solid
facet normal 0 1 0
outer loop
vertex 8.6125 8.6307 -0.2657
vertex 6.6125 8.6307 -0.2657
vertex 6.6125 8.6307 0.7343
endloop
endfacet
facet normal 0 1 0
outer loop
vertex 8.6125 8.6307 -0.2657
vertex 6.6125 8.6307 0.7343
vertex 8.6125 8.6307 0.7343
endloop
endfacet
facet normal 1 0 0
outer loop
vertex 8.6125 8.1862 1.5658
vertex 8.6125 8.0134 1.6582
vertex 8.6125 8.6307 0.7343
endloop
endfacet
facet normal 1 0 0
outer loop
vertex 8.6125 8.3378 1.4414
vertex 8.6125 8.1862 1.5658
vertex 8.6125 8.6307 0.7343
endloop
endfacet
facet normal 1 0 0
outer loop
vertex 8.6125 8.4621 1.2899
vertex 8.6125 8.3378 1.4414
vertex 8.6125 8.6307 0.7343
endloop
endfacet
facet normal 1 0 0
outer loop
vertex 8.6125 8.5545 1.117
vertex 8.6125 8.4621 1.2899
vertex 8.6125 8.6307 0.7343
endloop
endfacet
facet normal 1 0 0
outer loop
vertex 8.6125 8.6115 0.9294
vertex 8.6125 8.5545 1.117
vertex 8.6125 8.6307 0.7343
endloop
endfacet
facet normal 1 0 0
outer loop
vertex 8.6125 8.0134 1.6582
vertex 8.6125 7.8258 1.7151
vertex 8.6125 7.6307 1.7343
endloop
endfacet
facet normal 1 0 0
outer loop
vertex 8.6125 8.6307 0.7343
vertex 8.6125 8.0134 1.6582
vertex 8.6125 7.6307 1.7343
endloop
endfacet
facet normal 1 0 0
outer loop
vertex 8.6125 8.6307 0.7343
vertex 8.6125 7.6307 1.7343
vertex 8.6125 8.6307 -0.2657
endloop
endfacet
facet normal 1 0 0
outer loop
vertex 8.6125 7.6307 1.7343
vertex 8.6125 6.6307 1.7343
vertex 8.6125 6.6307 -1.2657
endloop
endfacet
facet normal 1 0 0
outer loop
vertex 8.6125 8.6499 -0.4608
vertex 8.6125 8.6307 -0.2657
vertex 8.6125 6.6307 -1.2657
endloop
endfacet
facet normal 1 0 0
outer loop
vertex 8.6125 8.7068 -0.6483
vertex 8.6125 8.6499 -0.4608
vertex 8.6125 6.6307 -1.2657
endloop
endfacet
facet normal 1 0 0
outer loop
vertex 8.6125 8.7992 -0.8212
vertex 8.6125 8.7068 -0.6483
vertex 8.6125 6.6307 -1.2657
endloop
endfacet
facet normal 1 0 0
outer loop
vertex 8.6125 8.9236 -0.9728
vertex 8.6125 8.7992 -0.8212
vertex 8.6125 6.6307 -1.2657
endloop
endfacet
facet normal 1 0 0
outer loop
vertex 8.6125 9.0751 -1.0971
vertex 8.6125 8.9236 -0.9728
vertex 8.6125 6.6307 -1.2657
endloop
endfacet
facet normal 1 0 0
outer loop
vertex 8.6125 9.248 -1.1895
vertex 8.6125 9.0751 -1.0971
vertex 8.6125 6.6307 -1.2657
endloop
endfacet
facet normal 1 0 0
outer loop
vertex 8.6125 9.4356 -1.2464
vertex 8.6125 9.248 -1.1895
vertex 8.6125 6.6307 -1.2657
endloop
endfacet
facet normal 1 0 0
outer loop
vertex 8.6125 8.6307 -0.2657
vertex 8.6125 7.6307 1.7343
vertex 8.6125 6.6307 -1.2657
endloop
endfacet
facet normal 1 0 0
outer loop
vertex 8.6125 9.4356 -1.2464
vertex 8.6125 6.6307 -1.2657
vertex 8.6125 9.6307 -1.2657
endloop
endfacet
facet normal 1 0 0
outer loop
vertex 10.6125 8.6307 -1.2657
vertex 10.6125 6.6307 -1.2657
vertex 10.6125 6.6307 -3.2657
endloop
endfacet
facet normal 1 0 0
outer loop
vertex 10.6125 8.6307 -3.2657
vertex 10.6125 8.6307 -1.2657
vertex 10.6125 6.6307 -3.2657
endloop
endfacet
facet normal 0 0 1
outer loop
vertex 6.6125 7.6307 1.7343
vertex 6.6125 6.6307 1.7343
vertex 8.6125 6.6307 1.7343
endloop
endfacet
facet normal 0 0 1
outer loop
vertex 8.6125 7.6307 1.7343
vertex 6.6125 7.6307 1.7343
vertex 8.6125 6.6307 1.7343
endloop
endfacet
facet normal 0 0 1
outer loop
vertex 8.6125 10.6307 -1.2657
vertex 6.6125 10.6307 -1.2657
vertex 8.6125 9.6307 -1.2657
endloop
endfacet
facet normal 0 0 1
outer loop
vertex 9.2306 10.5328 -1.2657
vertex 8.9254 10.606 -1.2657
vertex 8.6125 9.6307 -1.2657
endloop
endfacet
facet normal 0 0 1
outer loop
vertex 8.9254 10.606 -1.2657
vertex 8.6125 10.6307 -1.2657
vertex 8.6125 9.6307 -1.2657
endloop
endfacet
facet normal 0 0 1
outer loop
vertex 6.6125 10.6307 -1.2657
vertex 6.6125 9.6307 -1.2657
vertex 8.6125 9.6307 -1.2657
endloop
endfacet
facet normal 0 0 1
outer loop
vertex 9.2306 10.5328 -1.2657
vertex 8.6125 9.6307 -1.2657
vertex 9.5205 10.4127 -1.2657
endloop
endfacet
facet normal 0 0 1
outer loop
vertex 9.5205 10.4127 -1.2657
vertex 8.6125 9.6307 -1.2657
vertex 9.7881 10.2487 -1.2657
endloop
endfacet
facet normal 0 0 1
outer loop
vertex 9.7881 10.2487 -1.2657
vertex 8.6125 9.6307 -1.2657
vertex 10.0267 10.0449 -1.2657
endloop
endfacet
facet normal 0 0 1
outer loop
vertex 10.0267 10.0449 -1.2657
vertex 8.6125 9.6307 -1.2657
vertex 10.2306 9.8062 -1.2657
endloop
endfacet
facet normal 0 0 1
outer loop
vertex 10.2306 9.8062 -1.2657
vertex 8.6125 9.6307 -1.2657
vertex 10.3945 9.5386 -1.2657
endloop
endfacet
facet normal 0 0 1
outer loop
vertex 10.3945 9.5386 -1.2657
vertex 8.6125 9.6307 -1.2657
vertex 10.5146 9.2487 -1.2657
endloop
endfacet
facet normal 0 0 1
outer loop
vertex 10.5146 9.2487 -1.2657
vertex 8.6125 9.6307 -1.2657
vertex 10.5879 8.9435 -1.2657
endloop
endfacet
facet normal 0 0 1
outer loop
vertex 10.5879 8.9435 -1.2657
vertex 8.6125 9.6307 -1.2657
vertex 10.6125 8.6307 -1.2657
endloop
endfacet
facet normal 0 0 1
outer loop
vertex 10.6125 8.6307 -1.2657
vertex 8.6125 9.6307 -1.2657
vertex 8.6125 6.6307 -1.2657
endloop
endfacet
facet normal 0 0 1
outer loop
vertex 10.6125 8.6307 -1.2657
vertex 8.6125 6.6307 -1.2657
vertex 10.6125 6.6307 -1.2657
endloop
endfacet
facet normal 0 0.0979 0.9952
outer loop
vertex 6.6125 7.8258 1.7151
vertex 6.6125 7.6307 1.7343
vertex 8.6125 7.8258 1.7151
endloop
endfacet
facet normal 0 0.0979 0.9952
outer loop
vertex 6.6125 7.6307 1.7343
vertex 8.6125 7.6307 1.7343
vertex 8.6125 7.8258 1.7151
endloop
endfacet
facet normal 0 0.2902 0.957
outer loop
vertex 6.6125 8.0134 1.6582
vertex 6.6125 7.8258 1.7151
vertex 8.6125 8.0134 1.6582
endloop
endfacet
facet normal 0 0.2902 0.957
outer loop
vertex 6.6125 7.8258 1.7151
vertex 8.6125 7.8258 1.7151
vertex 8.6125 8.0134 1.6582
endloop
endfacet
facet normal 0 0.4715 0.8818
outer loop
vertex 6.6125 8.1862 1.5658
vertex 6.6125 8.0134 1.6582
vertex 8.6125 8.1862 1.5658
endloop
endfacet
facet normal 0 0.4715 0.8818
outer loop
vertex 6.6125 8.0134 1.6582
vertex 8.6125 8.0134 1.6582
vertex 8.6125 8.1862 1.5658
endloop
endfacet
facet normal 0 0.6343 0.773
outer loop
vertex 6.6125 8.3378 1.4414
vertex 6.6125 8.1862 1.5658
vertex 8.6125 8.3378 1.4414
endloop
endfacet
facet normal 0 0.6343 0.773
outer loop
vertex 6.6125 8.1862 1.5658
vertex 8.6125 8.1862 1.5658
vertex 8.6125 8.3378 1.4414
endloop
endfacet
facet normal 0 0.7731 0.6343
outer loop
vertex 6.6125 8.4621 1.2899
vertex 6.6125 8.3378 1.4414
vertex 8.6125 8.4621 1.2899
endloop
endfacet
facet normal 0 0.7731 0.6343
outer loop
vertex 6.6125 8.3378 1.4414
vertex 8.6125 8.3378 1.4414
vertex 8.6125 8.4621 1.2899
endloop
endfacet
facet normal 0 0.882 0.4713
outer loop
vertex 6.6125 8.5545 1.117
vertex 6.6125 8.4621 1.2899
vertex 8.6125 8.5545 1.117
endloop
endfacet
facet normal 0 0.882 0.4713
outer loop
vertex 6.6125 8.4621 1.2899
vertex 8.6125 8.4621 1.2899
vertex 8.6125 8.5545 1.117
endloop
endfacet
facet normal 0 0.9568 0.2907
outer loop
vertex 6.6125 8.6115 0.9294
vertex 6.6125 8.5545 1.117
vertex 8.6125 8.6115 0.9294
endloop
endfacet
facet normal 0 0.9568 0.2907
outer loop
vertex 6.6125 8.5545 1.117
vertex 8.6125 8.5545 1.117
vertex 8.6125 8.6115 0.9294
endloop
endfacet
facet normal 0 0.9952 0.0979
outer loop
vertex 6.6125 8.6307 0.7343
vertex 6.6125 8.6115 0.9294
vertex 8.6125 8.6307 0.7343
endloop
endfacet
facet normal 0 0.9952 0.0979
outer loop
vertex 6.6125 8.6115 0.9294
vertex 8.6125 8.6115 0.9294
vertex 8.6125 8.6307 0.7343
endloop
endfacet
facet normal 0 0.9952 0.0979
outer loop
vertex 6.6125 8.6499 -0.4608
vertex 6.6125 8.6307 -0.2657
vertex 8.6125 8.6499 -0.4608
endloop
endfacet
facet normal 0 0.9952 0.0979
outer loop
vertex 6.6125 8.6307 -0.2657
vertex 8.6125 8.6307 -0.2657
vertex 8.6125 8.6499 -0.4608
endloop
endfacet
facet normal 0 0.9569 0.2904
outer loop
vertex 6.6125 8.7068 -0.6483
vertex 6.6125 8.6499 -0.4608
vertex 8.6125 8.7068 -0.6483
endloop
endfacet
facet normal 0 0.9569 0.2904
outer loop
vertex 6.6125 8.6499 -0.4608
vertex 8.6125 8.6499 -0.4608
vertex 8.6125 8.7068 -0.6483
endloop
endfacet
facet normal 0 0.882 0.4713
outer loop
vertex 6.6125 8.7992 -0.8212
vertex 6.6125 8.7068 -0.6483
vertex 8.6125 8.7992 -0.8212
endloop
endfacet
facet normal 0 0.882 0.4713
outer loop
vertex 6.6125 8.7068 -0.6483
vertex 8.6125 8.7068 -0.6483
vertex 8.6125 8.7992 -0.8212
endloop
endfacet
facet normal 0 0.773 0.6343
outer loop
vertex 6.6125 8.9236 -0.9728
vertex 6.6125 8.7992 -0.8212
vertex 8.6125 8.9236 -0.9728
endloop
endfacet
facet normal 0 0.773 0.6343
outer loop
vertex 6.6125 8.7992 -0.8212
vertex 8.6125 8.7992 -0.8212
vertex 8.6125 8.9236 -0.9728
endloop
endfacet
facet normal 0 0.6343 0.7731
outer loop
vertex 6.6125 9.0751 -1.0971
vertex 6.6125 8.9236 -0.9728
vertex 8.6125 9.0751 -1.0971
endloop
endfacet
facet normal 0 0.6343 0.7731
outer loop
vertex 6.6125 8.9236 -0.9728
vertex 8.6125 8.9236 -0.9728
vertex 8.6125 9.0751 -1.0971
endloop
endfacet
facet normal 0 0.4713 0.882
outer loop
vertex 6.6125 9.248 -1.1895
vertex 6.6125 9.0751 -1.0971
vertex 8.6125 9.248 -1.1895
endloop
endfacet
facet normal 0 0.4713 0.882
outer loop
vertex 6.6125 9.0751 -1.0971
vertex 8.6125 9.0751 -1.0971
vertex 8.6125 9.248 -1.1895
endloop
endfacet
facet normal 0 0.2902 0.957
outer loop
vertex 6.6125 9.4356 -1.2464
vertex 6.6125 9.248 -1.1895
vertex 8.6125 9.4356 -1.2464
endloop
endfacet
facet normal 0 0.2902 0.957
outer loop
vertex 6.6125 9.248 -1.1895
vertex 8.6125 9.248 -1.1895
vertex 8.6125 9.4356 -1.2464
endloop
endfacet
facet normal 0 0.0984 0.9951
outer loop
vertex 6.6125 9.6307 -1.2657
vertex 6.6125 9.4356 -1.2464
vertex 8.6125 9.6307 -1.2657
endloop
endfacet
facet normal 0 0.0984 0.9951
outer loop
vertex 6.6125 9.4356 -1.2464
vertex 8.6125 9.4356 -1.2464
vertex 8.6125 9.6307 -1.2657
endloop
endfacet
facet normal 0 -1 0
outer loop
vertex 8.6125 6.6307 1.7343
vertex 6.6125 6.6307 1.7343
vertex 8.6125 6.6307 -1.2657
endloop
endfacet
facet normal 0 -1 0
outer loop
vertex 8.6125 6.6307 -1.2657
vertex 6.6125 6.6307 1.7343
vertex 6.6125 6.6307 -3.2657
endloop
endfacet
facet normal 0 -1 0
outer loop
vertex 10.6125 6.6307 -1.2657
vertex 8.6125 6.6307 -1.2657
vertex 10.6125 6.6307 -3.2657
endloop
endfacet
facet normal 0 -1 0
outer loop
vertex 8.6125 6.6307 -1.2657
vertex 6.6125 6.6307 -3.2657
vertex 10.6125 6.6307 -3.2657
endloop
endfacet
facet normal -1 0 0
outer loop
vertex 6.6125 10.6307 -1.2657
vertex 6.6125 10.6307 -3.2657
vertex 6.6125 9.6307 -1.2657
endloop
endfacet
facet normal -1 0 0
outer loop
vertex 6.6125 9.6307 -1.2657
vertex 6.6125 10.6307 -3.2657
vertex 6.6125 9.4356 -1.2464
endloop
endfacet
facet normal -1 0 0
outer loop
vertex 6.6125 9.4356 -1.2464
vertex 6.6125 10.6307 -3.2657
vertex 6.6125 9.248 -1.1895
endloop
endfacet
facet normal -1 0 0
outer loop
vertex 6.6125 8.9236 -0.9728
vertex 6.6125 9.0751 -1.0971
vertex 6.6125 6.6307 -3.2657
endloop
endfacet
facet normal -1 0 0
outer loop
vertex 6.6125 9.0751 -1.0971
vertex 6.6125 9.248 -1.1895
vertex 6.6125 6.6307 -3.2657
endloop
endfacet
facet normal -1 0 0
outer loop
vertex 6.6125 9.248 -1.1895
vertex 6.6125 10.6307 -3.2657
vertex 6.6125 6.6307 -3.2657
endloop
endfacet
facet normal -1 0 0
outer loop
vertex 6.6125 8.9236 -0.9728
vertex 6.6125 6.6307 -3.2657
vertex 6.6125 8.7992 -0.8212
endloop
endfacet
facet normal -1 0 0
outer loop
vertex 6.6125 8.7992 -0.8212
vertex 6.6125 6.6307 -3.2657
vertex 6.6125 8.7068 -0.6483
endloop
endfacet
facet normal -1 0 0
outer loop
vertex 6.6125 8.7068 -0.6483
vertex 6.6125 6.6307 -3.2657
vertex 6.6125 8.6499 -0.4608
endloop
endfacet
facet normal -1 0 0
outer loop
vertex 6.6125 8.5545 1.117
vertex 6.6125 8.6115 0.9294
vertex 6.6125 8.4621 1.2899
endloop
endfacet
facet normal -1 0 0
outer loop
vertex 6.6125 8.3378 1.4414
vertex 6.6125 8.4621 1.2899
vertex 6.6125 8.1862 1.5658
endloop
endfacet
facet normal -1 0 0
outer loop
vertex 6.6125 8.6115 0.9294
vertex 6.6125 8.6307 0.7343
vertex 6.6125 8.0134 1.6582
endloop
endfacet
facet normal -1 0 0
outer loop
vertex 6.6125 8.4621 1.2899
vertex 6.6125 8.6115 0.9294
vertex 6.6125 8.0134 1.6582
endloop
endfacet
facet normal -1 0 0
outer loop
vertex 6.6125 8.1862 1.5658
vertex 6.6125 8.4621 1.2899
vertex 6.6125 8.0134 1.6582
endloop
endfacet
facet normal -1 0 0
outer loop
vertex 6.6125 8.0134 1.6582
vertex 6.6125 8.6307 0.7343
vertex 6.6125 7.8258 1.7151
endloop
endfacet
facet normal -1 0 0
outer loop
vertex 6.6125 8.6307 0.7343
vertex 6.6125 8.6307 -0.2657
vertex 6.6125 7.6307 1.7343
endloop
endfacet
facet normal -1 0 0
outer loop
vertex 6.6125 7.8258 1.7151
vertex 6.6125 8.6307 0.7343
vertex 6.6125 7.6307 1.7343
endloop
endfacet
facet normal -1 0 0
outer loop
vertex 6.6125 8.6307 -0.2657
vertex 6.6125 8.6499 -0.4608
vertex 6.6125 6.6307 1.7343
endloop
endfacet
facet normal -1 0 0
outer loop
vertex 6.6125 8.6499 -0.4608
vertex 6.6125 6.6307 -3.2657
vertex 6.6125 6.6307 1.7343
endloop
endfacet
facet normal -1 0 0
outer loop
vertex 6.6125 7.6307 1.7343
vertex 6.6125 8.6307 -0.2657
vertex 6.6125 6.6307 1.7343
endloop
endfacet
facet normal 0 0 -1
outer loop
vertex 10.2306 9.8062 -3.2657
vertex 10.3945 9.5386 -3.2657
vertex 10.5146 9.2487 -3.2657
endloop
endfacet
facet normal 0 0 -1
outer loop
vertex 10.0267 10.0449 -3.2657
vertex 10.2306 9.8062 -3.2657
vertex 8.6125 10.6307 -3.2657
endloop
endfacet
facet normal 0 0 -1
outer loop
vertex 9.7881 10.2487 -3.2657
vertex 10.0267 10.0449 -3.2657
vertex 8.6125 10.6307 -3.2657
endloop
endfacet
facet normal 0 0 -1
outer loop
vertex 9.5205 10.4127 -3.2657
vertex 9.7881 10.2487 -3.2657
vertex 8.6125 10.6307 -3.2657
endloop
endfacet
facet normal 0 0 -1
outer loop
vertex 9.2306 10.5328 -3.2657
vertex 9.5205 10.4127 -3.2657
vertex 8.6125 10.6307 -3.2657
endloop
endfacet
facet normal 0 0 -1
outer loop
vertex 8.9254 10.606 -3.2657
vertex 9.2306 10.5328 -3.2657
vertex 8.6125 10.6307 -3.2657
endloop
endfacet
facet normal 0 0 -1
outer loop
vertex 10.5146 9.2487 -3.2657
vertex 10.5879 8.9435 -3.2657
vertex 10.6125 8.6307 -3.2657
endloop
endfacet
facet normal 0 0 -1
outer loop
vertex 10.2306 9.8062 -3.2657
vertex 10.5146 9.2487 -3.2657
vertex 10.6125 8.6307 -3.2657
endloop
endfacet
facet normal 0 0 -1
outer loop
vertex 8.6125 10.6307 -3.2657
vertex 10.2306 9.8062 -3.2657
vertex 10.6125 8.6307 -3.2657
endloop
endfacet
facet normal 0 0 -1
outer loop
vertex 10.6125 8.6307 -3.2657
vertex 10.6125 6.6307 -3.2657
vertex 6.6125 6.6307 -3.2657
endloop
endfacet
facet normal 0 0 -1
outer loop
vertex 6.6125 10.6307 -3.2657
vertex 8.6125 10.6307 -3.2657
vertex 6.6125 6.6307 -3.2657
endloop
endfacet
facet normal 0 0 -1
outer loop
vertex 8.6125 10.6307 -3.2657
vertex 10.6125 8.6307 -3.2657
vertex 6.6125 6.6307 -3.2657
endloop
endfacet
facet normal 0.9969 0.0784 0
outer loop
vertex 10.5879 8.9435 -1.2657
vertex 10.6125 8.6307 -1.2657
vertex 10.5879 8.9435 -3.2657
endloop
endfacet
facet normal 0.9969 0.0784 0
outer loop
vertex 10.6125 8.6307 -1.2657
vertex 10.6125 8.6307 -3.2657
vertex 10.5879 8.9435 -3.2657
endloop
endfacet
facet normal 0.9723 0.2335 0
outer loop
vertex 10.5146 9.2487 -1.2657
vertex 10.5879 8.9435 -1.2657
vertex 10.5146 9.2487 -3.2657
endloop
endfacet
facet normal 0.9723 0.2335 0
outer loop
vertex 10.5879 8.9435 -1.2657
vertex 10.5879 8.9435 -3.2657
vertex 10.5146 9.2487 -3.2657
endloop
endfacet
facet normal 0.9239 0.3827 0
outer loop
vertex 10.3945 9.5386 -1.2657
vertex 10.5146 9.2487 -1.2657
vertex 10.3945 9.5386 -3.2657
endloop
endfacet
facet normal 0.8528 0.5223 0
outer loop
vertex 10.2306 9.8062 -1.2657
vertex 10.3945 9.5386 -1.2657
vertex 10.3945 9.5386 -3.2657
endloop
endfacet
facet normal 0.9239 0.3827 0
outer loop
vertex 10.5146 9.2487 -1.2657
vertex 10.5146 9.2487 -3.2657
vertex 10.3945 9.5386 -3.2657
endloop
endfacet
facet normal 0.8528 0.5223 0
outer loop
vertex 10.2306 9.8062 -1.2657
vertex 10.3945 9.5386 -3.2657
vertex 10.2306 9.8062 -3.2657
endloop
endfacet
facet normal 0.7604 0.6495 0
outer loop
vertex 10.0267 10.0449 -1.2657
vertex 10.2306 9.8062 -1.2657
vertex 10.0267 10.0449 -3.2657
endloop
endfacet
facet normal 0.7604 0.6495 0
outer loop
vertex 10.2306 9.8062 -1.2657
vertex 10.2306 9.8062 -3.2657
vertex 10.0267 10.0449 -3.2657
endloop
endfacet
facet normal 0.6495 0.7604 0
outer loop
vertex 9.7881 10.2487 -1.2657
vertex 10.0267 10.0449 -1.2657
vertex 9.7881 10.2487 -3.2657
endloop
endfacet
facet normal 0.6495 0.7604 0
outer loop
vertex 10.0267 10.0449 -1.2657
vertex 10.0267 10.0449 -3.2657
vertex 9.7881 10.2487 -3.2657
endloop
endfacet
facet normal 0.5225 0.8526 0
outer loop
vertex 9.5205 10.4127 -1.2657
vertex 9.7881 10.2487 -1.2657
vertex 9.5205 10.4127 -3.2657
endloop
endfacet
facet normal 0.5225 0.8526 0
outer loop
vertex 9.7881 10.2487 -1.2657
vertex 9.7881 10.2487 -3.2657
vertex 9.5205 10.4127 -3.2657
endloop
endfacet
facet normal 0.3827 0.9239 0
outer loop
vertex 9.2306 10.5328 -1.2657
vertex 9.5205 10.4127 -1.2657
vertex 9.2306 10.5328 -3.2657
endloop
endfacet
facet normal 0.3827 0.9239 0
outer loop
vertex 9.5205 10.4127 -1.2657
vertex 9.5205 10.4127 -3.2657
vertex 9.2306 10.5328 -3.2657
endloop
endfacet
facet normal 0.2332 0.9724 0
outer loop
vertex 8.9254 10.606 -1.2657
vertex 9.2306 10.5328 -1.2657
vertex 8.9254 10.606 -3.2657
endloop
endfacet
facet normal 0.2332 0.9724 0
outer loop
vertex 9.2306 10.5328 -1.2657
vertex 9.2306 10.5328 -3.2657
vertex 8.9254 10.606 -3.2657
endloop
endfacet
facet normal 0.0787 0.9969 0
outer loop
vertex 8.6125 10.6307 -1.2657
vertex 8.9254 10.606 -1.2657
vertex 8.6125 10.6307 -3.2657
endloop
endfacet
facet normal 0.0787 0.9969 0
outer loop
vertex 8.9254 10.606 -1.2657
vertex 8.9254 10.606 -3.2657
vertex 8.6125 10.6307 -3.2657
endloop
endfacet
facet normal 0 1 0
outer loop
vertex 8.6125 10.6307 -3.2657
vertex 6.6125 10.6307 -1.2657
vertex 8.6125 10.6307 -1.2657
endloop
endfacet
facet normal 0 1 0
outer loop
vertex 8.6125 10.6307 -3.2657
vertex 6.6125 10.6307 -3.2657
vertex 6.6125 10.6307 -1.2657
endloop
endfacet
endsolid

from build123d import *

# Parameters (mm, degrees)
SKETCH_1_W      = 10
SKETCH_1_H      = 15
EXTRUDE_1_DEPTH = 10
EXTRUDE_2_DEPTH = 20
FILLET_1_R      = 5
FILLET_2_R      = 10
SCALE_1_SCALE   = 0.2


with BuildPart() as part:
    # 草圖1 → 填料-伸長1 (new body)
    with BuildSketch(Plane(origin=(0, 0, 0), x_dir=(1, 0, 0), z_dir=(0, 1, 0))):
        with Locations((5, -7.5)):
            Rectangle(SKETCH_1_W, SKETCH_1_H)
    extrude(amount=EXTRUDE_1_DEPTH)

    # 草圖1<3> → 填料-伸長2 (add)
    with BuildSketch(Plane(origin=(0, 0, 0), x_dir=(1, 0, 0), z_dir=(0, 1, 0))):
        Polygon((0, 10), (0, 0), (10, 0), (20, 0), (20, 10), align=None)
    extrude(amount=EXTRUDE_2_DEPTH)

    # 圓角1
    fillet_1_edges = [part.edges().sort_by_distance(p)[0] for p in [
        (5, 10, 15),
        (5, 10, 0),
    ]]
    fillet(fillet_1_edges, radius=FILLET_1_R)

    # 圓角2
    fillet_2_edges = [part.edges().sort_by_distance(p)[0] for p in [
        (20, 20, -5),
    ]]
    fillet(fillet_2_edges, radius=FILLET_2_R)


with BuildPart() as part_1:
    # 縮放比例1: scaled about (8.26566204, 8.288335436, -1.58207755)
    add(part.part.scale(SCALE_1_SCALE).moved(Location((6.612529632, 6.630668349, -1.26566204))))


solid = part_1.part
